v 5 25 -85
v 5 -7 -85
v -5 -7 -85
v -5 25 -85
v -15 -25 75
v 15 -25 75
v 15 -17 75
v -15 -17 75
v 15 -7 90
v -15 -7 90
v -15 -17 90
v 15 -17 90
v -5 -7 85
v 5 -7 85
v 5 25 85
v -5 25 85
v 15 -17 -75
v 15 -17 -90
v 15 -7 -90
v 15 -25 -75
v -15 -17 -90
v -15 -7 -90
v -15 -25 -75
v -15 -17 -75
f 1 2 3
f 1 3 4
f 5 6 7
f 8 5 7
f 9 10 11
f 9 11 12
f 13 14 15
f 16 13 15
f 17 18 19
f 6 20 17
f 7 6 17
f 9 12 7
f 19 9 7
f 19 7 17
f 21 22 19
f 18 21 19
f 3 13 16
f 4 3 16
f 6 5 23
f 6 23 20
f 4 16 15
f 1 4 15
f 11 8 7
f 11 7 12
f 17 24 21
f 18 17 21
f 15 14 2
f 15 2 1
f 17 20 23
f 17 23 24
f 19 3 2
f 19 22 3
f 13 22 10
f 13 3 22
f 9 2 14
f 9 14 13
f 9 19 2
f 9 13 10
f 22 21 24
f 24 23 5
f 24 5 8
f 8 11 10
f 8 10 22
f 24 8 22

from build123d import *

# Parameters (mm, degrees)
SKETCH_W        = 30
SKETCH_H        = 50
PAD_DEPTH       = 180
SKETCH001_W     = 8
SKETCH001_H     = 15
SKETCH001_W_2   = 32
SKETCH001_H_2   = 5
POCKET_DEPTH    = 408.418759
SKETCH002_W     = 10
SKETCH002_H     = 32
POCKET001_DEPTH = 558.418759


with BuildPart() as part:
    # Sketch (on DatumPlane) → Pad (new body)
    with BuildSketch(Plane.XY.offset(90)):
        Rectangle(SKETCH_W, SKETCH_H)
    extrude(amount=-PAD_DEPTH)

    # Sketch001 (on DatumPlane) → Pocket (cut, through all)
    with BuildSketch(Plane.YZ.offset(15)):
        with Locations((-21, 82.5)):
            Rectangle(SKETCH001_W, SKETCH001_H)
        with Locations((9, 87.5)):
            Rectangle(SKETCH001_W_2, SKETCH001_H_2)
    pocket = extrude(amount=-POCKET_DEPTH, mode=Mode.SUBTRACT)

    # Mirrored: Pocket across XY
    add(pocket.mirror(Plane.XY), mode=Mode.SUBTRACT)

    # Sketch002 (on DatumPlane) → Pocket001 (cut, through all)
    with BuildSketch(Plane.XY.offset(90)):
        with Locations((10, 9)):
            Rectangle(SKETCH002_W, SKETCH002_H)
    pocket001 = extrude(amount=-POCKET001_DEPTH, mode=Mode.SUBTRACT)

    # Mirrored001: Pocket001 across Sketch002 V_Axis
    add(pocket001.mirror(Plane(origin=(0, 0, 90), x_dir=(0, 0, 1), z_dir=(1, 0, 0))), mode=Mode.SUBTRACT)


solid = part.part
